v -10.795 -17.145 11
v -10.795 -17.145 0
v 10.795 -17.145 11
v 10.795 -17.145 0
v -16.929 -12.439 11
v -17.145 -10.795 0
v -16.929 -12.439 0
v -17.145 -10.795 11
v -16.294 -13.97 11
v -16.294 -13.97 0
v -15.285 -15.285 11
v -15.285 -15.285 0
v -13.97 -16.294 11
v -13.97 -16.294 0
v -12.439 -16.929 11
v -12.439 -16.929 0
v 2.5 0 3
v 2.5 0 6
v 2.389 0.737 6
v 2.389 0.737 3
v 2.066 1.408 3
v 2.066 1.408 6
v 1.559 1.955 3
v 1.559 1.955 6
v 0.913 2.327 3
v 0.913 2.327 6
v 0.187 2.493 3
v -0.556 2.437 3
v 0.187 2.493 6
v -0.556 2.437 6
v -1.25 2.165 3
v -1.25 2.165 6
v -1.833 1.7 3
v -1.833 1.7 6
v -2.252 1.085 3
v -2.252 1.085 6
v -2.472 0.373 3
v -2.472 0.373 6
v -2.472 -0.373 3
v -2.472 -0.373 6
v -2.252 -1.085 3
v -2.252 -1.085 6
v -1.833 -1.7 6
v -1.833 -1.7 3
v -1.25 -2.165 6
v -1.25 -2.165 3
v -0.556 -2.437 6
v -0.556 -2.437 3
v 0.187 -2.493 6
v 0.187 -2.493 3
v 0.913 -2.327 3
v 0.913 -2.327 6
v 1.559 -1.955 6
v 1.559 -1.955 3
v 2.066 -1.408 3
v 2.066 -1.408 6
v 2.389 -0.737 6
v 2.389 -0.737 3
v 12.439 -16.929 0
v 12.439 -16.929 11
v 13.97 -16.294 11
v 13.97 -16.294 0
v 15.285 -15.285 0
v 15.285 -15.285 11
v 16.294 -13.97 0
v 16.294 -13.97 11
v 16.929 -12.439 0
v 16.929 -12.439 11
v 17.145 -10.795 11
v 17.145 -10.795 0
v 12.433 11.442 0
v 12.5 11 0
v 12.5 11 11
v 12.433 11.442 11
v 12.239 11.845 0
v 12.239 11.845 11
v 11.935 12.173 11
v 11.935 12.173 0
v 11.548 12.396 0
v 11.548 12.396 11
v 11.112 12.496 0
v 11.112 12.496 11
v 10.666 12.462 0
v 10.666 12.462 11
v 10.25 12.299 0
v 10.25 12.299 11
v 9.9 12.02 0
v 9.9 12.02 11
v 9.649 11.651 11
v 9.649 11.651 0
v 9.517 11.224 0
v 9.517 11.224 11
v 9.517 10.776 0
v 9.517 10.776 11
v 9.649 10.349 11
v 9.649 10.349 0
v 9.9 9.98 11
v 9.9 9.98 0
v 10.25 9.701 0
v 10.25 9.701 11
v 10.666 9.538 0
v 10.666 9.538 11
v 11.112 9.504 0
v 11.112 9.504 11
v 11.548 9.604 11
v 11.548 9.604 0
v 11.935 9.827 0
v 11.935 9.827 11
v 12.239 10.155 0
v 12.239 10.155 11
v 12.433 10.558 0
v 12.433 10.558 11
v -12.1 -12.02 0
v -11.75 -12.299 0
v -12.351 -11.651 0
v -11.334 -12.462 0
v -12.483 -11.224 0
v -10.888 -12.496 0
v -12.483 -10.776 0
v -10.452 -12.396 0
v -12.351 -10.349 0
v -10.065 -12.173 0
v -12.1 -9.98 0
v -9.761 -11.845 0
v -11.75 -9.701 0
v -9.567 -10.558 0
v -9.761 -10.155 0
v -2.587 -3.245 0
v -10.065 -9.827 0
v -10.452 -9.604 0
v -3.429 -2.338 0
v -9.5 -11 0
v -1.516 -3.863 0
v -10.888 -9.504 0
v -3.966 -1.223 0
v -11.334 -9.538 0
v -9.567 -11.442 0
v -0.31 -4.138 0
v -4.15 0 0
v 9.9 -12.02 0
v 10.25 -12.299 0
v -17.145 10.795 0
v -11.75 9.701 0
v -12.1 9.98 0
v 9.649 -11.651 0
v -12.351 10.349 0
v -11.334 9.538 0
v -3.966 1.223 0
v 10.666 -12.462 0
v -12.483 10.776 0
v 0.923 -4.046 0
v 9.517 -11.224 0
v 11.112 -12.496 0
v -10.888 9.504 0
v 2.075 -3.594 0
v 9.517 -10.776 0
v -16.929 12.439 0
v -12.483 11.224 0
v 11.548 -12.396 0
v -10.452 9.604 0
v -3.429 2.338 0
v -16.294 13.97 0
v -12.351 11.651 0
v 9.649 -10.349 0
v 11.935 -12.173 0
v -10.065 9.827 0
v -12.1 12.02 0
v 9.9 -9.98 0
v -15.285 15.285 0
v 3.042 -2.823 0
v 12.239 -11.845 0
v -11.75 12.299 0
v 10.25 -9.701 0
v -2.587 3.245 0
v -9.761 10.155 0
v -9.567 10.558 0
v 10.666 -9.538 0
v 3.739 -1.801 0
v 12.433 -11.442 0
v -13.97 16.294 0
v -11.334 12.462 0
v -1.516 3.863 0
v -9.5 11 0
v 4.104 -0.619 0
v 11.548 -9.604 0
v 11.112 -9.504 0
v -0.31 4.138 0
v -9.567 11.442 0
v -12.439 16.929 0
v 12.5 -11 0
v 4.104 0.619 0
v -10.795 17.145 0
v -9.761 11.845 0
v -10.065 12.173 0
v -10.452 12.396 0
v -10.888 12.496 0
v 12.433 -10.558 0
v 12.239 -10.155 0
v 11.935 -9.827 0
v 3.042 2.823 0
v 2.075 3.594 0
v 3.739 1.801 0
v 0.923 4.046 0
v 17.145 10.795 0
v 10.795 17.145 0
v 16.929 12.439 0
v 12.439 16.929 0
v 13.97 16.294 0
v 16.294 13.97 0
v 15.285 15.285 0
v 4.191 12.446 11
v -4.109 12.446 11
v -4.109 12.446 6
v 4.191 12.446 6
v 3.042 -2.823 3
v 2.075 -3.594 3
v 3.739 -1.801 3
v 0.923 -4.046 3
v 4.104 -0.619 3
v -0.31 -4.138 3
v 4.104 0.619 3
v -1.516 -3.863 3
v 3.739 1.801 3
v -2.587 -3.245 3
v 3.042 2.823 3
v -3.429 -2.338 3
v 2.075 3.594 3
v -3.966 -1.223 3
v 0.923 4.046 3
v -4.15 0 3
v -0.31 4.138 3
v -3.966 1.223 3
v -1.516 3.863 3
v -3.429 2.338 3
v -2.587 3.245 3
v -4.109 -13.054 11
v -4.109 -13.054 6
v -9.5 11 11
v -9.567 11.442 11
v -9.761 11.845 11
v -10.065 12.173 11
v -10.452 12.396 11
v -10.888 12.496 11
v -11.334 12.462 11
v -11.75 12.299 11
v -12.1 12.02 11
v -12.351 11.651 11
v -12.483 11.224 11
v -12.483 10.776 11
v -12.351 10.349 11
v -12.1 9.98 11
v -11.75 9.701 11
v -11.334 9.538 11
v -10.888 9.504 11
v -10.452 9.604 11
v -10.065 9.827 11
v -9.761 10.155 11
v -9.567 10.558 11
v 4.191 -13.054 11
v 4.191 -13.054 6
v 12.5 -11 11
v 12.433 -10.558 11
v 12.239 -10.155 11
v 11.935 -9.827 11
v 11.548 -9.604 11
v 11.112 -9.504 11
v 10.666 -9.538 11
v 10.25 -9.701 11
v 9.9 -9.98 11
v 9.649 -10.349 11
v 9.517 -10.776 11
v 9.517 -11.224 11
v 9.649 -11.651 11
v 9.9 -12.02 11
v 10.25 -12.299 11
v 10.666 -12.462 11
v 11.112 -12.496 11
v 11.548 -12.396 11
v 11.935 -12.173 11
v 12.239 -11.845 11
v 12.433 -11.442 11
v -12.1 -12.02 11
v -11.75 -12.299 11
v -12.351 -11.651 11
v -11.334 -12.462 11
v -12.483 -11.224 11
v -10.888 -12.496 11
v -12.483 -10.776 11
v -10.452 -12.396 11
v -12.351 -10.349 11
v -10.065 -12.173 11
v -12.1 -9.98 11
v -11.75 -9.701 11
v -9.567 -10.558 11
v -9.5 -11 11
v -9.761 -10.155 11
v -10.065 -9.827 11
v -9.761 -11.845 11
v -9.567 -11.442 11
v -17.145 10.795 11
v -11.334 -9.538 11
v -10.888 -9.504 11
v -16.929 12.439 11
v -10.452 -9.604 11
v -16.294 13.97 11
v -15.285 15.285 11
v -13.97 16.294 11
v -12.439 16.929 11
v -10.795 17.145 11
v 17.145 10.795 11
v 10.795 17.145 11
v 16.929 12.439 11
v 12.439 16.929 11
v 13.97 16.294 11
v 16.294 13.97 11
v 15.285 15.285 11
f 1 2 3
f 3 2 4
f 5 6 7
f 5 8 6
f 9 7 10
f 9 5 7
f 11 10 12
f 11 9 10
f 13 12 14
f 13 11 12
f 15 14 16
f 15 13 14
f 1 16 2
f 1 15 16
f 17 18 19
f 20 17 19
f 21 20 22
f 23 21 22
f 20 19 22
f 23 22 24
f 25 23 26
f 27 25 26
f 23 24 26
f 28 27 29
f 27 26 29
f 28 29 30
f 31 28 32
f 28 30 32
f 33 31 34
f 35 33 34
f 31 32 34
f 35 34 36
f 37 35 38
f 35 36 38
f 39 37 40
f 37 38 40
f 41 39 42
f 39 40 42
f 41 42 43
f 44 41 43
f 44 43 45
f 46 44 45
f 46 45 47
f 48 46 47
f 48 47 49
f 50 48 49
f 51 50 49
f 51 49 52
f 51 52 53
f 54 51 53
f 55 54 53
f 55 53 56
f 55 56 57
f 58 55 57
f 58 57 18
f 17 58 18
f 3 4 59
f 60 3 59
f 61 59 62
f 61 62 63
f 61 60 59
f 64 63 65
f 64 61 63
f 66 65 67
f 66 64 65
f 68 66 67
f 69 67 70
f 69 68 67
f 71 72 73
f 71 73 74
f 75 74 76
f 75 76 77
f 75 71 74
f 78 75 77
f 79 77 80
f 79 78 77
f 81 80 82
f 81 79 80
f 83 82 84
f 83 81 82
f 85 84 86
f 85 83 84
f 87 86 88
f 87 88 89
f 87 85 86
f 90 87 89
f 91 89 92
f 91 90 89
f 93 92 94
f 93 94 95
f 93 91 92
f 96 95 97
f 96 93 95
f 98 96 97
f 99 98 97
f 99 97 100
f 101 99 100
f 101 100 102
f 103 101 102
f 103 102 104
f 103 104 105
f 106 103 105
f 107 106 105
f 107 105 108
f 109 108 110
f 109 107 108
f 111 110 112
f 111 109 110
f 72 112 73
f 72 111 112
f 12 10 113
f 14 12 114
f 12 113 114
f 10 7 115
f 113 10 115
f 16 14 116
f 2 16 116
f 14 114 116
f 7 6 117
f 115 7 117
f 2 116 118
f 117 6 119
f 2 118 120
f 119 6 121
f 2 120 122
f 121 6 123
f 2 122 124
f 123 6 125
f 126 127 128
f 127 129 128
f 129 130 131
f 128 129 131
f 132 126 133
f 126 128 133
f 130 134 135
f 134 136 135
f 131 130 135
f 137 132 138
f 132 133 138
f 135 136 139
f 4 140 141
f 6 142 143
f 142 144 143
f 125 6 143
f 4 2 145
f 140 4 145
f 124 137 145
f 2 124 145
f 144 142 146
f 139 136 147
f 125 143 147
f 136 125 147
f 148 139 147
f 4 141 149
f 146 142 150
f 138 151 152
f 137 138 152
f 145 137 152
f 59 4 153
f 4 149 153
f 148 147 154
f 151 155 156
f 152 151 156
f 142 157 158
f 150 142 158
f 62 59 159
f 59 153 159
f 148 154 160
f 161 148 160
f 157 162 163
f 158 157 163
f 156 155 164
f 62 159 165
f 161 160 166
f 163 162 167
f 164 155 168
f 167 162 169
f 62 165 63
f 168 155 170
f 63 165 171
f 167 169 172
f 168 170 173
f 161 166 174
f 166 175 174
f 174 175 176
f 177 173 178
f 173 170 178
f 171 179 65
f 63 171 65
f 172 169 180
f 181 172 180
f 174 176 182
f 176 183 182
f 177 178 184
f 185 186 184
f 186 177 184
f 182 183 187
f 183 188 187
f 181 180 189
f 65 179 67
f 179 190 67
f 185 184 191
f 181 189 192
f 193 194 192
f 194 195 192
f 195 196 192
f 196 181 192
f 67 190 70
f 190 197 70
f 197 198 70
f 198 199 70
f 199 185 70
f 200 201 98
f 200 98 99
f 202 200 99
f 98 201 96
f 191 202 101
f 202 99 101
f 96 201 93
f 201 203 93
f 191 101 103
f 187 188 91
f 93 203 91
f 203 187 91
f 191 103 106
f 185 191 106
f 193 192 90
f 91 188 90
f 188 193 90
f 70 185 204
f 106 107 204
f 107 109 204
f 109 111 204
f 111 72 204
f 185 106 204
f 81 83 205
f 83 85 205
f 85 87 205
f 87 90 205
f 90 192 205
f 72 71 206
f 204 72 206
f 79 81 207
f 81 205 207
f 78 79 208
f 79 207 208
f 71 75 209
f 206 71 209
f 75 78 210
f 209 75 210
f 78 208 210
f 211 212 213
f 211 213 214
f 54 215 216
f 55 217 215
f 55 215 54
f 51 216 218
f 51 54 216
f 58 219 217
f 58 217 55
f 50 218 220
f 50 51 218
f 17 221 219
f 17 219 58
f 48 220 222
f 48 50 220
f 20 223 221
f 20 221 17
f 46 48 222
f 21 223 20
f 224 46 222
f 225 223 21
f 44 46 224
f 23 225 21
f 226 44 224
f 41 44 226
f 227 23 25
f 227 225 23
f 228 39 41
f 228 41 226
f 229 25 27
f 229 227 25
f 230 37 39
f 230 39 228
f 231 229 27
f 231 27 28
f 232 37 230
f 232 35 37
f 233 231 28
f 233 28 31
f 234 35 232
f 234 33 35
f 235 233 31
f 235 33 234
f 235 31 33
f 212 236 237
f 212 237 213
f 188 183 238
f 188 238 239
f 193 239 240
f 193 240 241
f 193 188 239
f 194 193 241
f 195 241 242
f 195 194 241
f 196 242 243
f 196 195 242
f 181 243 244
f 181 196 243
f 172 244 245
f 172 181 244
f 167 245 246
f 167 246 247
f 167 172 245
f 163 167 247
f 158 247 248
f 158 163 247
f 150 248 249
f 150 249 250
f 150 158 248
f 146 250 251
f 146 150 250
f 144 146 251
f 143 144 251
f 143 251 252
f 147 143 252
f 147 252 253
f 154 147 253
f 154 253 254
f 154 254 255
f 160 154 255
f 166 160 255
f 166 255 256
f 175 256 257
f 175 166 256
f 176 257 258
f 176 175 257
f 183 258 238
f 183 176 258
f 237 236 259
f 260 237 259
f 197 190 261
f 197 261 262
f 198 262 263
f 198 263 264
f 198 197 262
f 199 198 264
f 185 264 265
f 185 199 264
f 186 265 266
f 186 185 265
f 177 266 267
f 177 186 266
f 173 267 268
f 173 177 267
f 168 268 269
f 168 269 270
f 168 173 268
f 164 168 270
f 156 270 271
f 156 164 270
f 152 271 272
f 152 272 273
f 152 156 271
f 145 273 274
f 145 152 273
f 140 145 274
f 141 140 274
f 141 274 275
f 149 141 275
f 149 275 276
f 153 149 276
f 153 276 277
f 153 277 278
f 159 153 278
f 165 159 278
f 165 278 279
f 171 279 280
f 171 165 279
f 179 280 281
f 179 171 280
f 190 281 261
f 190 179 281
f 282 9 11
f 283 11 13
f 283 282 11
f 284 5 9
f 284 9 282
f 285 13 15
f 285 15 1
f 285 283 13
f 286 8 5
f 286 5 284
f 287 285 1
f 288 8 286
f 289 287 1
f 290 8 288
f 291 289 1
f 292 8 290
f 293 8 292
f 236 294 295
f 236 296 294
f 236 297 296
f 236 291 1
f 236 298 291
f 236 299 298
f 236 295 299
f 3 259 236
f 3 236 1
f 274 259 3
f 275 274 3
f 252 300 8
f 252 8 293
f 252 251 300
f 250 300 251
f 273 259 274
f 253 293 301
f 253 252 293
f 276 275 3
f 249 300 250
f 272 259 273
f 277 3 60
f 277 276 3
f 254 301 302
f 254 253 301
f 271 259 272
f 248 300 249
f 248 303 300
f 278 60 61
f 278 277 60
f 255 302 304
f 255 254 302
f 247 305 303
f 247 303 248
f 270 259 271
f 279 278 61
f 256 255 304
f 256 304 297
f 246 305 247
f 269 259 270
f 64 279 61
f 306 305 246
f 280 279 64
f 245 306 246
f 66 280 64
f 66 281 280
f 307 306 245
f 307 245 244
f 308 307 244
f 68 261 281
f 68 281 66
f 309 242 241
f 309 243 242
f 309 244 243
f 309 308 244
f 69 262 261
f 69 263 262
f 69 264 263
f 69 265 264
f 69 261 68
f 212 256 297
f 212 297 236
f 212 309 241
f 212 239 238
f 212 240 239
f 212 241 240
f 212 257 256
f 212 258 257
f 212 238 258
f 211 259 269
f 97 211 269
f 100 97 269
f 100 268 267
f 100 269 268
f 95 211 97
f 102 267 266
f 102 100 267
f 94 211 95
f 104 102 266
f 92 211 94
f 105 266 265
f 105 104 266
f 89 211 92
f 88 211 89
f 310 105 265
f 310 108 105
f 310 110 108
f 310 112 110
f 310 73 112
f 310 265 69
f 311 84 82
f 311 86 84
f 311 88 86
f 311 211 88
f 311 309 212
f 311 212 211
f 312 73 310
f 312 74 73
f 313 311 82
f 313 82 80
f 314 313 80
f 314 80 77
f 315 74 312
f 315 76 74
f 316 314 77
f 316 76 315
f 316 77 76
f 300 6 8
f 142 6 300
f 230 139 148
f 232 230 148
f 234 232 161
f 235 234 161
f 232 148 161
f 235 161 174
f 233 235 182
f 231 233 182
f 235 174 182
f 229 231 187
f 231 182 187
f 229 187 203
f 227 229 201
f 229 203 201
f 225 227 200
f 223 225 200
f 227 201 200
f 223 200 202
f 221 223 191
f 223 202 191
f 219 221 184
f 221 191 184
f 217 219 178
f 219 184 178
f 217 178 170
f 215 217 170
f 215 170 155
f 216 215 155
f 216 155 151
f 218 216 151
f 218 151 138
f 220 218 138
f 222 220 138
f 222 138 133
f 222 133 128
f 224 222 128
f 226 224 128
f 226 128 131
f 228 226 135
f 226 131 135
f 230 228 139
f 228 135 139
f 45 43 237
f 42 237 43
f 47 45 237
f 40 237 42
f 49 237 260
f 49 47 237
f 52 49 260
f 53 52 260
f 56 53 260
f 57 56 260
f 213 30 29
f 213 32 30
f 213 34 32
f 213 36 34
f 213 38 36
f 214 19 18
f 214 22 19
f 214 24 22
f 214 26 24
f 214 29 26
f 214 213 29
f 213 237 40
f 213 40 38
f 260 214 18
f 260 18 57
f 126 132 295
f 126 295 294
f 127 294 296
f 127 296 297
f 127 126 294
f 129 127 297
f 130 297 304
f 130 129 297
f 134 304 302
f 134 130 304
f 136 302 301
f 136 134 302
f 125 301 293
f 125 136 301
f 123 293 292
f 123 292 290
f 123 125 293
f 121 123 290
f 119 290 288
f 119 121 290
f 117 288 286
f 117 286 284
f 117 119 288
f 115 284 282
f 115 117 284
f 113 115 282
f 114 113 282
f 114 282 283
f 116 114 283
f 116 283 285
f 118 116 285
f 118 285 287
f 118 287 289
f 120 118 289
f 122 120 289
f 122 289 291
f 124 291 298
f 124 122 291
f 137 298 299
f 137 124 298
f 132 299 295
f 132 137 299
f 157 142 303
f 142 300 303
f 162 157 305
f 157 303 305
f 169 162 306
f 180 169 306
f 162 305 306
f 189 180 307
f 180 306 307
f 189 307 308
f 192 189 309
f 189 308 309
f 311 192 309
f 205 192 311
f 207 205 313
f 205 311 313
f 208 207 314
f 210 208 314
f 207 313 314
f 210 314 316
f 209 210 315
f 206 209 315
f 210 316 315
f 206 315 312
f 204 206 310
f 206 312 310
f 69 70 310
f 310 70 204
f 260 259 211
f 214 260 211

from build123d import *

# Parameters (mm, degrees)
SKETCH1_W           = 34.29
SKETCH1_H           = 34.29
SKETCH1_R           = 1.5
BOSS_EXTRUDE1_DEPTH = 11
SKETCH2_W           = 8.3
SKETCH2_H           = 25.5
CUT_EXTRUDE1_DEPTH  = 5
SKETCH3_R           = 2.5
CUT_EXTRUDE2_DEPTH  = 5
SKETCH5_R           = 4.15
CUT_EXTRUDE4_DEPTH  = 3
FILLET2_R           = 6.35


with BuildPart() as part:
    # Sketch1 → Boss-Extrude1 (new body)
    with BuildSketch(Plane.XY):
        Rectangle(SKETCH1_W, SKETCH1_H)
        with Locations((-11, 11)):
            Circle(SKETCH1_R, mode=Mode.SUBTRACT)
        with Locations((11, 11)):
            Circle(SKETCH1_R, mode=Mode.SUBTRACT)
        with Locations((-11, -11)):
            Circle(SKETCH1_R, mode=Mode.SUBTRACT)
        with Locations((11, -11)):
            Circle(SKETCH1_R, mode=Mode.SUBTRACT)
    extrude(amount=BOSS_EXTRUDE1_DEPTH)

    # Sketch2 → Cut-Extrude1 (cut)
    with BuildSketch(Plane.XY.offset(11)):
        with Locations((0.041, -0.304)):
            Rectangle(SKETCH2_W, SKETCH2_H)
    extrude(amount=-CUT_EXTRUDE1_DEPTH, mode=Mode.SUBTRACT)

    # Sketch3 → Cut-Extrude2 (cut)
    with BuildSketch(Plane.XY.offset(6)):
        Circle(SKETCH3_R)
    extrude(amount=-CUT_EXTRUDE2_DEPTH, mode=Mode.SUBTRACT)

    # Sketch5 → Cut-Extrude4 (cut)
    with BuildSketch(Plane(origin=(0, 0, 0), x_dir=(-1, 0, 0), z_dir=(0, 0, -1))):
        Circle(SKETCH5_R)
    extrude(amount=-CUT_EXTRUDE4_DEPTH, mode=Mode.SUBTRACT)

    # Fillet2
    fillet2_edges = [part.edges().sort_by_distance(p)[0] for p in [
        (17.145, -17.145, 5.5),
        (-17.145, -17.145, 5.5),
        (-17.145, 17.145, 5.5),
        (17.145, 17.145, 5.5),
    ]]
    fillet(fillet2_edges, radius=FILLET2_R)


solid = part.part
